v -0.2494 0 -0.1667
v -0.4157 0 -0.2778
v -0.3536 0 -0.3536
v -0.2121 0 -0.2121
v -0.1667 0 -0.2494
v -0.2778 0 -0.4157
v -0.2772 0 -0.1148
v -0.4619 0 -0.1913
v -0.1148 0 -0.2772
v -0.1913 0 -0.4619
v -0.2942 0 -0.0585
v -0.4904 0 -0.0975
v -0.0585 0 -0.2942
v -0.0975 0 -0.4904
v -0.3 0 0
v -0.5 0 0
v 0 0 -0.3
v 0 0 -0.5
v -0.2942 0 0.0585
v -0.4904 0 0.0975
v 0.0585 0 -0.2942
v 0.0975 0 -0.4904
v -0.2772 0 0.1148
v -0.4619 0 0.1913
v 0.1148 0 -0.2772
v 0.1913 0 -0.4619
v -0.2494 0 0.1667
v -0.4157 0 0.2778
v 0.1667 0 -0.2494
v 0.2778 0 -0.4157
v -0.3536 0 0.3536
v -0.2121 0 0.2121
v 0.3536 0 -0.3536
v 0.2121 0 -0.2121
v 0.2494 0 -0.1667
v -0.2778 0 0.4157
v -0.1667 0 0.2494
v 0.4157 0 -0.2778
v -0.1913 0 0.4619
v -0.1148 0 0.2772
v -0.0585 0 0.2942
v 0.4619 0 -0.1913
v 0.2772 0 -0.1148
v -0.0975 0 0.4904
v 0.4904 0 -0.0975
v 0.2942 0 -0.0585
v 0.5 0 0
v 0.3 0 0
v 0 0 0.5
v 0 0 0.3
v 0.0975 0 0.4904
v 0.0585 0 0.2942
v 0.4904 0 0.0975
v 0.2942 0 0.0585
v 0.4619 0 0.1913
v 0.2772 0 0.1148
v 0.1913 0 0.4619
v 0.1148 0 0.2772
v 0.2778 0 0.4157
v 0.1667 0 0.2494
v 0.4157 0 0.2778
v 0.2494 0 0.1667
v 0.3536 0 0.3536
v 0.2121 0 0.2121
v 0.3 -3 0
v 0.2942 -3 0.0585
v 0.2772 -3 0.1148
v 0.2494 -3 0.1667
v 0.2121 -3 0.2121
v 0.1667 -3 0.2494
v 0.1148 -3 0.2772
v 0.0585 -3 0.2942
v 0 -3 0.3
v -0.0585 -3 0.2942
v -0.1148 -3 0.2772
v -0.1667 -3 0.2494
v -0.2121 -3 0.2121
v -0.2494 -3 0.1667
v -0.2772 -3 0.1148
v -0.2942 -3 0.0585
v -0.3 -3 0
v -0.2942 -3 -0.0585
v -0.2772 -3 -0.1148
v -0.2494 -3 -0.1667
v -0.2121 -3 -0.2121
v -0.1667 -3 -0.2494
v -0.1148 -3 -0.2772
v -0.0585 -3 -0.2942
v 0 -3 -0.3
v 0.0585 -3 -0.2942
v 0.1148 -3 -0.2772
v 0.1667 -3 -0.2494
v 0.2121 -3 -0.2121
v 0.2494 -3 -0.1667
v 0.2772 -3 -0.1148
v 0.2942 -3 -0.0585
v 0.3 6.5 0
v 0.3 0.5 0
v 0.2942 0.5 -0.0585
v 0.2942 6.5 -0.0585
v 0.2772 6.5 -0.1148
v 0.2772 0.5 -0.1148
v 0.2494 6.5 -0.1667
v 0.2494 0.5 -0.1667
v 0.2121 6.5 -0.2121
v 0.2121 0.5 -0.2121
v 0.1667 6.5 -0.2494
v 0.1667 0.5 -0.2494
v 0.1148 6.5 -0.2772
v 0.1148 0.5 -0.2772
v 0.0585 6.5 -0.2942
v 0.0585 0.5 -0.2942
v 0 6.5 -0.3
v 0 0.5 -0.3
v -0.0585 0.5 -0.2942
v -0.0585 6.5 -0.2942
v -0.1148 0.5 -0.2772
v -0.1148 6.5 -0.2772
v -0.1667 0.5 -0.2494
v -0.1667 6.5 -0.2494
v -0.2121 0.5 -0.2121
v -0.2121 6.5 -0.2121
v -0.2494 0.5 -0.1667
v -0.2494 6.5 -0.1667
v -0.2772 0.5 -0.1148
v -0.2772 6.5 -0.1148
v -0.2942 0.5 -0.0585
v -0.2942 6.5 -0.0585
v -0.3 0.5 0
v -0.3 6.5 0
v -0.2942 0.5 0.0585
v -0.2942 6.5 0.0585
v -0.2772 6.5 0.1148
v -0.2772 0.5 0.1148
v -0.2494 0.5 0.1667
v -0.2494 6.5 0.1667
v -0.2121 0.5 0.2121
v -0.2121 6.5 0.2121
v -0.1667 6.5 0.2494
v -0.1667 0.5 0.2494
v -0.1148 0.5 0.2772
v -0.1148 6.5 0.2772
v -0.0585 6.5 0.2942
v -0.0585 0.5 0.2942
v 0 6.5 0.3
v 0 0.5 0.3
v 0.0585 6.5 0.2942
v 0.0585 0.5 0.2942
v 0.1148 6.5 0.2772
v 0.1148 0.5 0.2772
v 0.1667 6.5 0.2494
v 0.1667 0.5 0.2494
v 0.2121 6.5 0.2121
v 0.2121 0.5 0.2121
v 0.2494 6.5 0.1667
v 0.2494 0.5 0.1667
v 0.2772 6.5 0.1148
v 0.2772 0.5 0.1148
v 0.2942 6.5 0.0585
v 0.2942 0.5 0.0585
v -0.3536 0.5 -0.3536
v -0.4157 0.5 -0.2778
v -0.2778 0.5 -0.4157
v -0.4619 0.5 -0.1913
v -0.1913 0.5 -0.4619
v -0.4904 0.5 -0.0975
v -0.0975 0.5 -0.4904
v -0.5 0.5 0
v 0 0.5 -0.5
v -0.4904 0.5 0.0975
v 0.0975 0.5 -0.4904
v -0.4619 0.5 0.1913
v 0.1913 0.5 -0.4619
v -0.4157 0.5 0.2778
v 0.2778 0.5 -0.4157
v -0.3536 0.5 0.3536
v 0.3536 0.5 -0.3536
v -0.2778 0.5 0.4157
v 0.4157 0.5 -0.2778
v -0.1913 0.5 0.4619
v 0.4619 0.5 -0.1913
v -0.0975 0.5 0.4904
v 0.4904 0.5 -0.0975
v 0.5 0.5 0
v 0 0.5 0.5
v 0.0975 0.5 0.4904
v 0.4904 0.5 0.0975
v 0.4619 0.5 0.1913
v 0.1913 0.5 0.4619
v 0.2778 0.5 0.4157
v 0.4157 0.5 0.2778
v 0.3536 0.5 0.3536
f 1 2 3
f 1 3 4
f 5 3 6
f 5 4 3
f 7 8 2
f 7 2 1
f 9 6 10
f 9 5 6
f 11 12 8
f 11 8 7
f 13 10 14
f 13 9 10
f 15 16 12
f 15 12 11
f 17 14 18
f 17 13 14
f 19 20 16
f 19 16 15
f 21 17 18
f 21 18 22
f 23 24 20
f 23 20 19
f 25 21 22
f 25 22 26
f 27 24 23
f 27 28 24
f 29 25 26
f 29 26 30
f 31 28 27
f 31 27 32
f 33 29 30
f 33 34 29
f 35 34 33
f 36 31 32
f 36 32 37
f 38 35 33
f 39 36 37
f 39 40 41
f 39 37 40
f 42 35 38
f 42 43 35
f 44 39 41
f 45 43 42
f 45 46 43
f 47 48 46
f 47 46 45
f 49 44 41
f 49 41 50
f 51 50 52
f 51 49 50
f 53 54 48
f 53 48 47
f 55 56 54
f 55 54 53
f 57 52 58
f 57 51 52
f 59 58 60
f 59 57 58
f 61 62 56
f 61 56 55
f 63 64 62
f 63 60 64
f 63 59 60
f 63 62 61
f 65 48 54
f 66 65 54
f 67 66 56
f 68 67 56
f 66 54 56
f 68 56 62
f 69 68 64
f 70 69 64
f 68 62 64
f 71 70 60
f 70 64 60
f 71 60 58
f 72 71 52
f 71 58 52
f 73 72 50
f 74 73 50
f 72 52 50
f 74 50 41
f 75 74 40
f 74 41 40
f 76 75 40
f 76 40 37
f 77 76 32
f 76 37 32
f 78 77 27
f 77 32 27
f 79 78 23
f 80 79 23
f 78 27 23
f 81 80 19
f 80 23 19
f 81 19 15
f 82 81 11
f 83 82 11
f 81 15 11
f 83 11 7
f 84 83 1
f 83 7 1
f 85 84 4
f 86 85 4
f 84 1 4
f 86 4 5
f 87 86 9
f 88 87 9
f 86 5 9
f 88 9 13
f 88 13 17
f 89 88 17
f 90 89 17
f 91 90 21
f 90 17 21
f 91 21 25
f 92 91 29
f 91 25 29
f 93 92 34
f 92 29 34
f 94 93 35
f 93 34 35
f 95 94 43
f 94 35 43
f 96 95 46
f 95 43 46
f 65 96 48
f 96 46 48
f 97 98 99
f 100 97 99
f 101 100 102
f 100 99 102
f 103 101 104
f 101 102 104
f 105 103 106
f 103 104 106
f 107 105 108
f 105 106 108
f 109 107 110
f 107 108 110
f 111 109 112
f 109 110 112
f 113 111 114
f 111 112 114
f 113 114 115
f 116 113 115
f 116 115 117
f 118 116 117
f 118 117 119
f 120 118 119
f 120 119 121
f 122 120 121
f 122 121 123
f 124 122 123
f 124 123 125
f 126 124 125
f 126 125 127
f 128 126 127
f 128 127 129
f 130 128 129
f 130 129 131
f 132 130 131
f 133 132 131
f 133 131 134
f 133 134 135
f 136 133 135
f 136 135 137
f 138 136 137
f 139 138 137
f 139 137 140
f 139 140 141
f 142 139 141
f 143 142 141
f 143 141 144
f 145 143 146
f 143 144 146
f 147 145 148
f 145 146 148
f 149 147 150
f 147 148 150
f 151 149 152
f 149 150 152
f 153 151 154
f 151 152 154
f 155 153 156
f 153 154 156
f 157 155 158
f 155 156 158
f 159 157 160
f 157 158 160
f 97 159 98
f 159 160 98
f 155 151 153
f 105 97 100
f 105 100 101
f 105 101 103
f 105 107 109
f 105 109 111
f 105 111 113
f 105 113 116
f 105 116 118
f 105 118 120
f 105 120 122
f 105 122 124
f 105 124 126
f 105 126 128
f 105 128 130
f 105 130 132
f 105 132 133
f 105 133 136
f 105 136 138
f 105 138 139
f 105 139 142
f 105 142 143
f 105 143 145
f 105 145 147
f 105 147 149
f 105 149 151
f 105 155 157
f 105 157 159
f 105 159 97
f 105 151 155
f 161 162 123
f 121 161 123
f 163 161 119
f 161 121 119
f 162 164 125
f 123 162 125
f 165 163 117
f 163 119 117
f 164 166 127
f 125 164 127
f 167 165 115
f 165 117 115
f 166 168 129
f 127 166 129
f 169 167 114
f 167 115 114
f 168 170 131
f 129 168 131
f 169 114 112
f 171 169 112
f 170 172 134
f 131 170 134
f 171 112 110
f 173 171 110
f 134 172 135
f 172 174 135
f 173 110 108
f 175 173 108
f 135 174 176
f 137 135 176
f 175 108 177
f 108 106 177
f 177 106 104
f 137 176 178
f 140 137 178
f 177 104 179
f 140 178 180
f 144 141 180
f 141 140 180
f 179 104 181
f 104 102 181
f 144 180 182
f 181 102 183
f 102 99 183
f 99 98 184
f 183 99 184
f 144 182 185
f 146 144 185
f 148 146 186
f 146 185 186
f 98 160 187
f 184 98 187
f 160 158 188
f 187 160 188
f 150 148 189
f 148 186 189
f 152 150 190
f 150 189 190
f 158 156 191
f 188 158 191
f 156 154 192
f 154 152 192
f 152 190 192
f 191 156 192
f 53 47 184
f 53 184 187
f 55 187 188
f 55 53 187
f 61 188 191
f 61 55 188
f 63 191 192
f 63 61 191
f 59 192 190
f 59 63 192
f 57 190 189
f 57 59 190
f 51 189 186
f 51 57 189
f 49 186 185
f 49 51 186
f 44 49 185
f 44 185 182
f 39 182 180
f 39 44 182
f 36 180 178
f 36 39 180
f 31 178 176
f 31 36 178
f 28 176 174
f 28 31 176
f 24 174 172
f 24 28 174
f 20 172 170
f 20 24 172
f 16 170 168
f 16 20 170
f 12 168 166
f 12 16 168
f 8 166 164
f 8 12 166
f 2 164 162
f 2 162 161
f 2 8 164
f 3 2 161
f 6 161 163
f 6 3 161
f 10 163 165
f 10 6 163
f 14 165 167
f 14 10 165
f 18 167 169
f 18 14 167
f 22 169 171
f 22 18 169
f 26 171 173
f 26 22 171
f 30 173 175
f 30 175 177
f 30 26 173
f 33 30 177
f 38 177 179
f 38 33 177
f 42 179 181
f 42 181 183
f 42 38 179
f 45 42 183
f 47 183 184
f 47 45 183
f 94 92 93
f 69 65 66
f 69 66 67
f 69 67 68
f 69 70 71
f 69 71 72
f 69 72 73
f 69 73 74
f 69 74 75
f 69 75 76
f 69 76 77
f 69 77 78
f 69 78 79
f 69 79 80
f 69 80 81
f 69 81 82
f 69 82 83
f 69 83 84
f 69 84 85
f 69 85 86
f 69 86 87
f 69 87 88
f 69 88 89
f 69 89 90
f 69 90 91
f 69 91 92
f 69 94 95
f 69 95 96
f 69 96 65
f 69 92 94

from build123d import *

# Parameters (mm, degrees)
SKETCH2_R           = 0.3
BASE_EXTRUDE_DEPTH  = 6.5
SKETCH3_R           = 0.5
BOSS_EXTRUDE1_DEPTH = 0.5
SKETCH4_R           = 0.3
BOSS_EXTRUDE2_DEPTH = 3


with BuildPart() as part:
    # Sketch2 → Base-Extrude (new body)
    with BuildSketch(Plane(origin=(0, 0, 0), x_dir=(1, 0, 0), z_dir=(0, 1, 0))):
        Circle(SKETCH2_R)
    extrude(amount=BASE_EXTRUDE_DEPTH)

    # Sketch3 → Boss-Extrude1 (add)
    with BuildSketch(Plane.XZ):
        Circle(SKETCH3_R)
    extrude(amount=-BOSS_EXTRUDE1_DEPTH)

    # Sketch4 → Boss-Extrude2 (add)
    with BuildSketch(Plane.XZ):
        Circle(SKETCH4_R)
    extrude(amount=BOSS_EXTRUDE2_DEPTH)


solid = part.part
